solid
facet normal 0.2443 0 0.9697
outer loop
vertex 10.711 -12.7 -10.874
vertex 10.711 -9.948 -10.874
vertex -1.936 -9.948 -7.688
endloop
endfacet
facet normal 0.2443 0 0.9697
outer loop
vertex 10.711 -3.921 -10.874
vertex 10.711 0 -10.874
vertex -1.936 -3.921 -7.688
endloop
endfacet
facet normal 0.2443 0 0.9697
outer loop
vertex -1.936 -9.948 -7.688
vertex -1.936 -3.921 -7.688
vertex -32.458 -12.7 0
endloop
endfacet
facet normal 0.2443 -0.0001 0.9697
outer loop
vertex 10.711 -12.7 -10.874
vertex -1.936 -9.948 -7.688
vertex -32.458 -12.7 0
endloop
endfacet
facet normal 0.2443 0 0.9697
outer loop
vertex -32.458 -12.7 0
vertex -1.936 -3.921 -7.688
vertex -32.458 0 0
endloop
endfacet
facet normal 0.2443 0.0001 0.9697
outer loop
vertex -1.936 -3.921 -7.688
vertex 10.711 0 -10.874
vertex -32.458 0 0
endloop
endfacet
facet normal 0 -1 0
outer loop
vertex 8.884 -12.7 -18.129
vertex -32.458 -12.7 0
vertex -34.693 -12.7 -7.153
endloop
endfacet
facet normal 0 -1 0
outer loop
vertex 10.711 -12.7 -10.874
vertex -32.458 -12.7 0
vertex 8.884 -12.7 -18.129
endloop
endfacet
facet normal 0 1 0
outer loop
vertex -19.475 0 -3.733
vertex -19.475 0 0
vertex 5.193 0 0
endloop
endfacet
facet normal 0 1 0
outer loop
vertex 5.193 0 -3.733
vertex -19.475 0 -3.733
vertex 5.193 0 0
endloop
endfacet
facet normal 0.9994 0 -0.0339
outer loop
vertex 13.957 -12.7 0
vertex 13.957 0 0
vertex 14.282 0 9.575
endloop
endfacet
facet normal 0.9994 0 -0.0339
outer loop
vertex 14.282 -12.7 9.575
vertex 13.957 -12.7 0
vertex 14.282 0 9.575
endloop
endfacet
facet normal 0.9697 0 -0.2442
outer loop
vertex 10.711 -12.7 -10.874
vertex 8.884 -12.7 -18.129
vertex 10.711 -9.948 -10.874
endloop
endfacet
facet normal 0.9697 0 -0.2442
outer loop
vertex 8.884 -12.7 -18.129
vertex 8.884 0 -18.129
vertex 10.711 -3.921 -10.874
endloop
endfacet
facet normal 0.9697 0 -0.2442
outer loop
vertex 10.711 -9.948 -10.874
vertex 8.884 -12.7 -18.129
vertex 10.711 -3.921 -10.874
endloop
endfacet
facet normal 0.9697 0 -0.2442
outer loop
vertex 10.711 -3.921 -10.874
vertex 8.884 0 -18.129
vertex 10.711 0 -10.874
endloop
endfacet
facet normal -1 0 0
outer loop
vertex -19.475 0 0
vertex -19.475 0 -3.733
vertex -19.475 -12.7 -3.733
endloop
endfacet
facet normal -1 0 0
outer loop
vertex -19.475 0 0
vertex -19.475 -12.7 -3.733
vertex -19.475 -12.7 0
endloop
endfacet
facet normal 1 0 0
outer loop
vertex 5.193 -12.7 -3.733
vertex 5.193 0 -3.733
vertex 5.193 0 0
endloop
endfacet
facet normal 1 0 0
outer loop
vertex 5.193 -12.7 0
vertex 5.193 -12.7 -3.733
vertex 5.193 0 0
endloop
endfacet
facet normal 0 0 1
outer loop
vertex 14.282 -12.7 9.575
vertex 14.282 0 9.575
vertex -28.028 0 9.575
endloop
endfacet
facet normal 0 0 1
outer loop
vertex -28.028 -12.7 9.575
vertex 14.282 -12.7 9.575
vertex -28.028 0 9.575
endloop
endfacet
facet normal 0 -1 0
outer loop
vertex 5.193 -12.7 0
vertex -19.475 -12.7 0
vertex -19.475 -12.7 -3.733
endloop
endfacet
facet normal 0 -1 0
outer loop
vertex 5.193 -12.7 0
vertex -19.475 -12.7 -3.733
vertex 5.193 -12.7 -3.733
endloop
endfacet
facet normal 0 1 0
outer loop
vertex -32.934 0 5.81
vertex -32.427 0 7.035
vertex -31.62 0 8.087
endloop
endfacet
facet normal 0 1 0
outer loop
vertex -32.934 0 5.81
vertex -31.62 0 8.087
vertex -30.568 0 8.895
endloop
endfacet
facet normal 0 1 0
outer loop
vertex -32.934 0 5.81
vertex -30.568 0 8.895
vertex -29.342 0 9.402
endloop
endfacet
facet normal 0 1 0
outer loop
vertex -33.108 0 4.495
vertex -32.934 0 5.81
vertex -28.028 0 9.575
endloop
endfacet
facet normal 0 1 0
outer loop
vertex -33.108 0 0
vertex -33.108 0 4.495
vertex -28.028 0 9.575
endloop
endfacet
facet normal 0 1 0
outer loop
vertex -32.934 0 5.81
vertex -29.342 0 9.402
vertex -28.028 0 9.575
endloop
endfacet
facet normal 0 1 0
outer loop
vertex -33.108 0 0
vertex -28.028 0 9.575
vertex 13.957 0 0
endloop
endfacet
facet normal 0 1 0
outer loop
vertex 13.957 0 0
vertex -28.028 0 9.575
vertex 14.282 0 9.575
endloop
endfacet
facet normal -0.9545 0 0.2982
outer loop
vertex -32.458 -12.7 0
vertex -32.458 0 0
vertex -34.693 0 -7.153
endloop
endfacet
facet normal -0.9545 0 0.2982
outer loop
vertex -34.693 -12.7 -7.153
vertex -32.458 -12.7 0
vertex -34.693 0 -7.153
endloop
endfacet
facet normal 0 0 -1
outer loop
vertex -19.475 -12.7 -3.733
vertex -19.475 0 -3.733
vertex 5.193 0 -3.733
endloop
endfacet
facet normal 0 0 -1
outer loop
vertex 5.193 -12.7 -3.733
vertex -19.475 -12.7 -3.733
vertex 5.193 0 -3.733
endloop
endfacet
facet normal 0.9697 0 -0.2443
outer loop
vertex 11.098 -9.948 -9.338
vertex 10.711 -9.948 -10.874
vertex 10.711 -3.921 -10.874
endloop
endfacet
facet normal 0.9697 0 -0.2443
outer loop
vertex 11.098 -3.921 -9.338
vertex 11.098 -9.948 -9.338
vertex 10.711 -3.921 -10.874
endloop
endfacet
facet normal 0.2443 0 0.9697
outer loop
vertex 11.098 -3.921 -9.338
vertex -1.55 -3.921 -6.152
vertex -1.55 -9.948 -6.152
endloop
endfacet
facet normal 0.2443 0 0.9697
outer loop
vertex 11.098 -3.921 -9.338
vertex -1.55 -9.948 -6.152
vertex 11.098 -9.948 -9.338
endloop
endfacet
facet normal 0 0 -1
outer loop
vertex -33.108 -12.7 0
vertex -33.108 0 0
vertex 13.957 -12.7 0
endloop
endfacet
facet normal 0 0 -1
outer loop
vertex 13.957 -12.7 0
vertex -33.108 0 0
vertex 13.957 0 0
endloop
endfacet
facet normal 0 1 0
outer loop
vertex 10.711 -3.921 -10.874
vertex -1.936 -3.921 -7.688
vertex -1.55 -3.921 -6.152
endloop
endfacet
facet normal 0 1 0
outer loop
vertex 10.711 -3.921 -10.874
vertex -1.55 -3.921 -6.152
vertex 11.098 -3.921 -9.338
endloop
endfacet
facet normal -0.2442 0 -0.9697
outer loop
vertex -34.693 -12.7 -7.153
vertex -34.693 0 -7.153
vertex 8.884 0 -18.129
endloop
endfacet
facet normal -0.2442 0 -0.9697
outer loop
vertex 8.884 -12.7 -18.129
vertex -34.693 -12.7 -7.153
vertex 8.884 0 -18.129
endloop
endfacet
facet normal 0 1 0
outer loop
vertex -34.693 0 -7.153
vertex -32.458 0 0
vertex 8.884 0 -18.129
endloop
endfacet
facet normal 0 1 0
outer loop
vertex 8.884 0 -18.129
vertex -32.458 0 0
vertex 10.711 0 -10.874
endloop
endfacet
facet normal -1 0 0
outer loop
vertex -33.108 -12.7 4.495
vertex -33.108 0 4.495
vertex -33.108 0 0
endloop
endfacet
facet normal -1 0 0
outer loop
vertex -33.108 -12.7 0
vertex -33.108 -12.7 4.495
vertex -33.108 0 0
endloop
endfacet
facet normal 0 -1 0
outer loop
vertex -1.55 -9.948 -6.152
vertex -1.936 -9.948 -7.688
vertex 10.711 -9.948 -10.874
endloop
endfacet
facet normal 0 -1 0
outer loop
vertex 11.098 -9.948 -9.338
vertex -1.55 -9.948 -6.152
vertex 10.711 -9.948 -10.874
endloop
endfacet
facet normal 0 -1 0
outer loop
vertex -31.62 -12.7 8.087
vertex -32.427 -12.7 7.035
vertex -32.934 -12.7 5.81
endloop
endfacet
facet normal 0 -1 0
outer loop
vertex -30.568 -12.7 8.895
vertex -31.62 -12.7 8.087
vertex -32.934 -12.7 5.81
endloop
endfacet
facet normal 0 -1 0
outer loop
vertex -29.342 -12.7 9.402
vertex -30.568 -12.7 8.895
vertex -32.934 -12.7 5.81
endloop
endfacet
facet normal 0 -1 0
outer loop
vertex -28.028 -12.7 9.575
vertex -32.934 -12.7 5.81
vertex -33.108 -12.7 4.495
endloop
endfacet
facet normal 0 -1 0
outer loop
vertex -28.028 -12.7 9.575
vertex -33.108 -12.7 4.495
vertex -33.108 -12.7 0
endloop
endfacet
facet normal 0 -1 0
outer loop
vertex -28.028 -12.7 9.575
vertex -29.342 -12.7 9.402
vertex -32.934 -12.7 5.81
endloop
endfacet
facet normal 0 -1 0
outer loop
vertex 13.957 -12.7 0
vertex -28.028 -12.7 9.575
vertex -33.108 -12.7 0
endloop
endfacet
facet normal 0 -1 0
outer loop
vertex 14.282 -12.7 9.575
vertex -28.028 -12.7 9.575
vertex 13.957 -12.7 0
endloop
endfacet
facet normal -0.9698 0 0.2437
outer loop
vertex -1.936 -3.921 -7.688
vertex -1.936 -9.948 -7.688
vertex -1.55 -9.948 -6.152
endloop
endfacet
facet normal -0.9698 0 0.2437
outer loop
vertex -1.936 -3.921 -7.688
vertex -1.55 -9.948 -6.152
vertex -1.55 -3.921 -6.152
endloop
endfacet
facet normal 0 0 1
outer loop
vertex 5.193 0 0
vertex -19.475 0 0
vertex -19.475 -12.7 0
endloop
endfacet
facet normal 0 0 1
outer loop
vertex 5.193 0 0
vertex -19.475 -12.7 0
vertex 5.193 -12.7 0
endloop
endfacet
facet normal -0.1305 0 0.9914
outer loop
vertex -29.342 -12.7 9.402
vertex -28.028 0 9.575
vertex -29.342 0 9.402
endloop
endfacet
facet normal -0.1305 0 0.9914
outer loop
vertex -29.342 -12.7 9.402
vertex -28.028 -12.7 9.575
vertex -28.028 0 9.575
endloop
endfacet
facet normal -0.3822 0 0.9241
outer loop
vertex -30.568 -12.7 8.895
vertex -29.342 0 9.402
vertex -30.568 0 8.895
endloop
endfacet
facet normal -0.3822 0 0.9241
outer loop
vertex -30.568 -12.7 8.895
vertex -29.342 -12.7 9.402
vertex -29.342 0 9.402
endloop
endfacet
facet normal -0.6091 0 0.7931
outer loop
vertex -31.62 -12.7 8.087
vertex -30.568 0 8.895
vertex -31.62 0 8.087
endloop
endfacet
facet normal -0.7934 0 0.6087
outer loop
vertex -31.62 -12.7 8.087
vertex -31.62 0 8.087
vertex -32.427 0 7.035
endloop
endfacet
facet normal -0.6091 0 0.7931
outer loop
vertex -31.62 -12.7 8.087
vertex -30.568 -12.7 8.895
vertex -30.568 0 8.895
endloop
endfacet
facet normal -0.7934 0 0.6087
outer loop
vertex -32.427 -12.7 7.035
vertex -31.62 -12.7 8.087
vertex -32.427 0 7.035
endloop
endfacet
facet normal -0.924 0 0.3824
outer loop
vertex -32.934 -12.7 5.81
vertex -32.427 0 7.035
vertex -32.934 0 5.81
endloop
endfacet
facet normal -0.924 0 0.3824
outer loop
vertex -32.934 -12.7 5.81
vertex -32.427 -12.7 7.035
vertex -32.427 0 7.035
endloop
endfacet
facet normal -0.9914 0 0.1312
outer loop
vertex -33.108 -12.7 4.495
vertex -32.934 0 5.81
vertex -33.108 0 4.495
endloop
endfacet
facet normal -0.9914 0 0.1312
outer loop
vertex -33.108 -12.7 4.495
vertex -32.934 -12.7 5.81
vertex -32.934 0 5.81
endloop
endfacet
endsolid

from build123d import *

# Parameters (mm, degrees)
F1_DEPTH = 12.7
F3_DEPTH = 12.7
F4_W     = 24.668398
F4_H     = 3.732718
F5_DEPTH = 12.7
F6_W     = 13.042734
F6_H     = 6.027006
F7_DEPTH = 1.58349
F8_R     = 5.08


with BuildPart() as f1:
    # F0 (on Front) → F1 (new body)
    with BuildSketch(Plane.XZ):
        Polygon((-33.107586, 0), (13.957119, 0), (14.281703, 9.575234), (-33.107586, 9.575234), align=None)
    extrude(amount=F1_DEPTH)

    # F8
    f8_edges = [f1.edges().sort_by_distance(p)[0] for p in [
        (-33.107586, -6.35, 9.575234),
    ]]
    fillet(f8_edges, radius=F8_R)


with BuildPart() as f3:
    # F2 (on Front) → F3 (new body)
    with BuildSketch(Plane.XZ):
        Polygon((10.711278, -10.873571), (-32.458417, 0), (-34.692648, -7.152828), (8.883818, -18.128857), align=None)
    extrude(amount=F3_DEPTH)

    # F6 (on face) → F7 (join)
    with BuildSketch(Plane(origin=(-1.936419, 0, -7.687873), x_dir=(0.969712, 0, -0.244251), z_dir=(0.244251, 0, 0.969712))):
        with Locations((6.521367, -6.934733)):
            Rectangle(F6_W, F6_H)
    extrude(amount=F7_DEPTH)


with BuildPart() as f5:
    # F4 (on Front) → F5 (new body)
    with BuildSketch(Plane.XZ):
        with Locations((-7.140851, -1.866359)):
            Rectangle(F4_W, F4_H)
    extrude(amount=F5_DEPTH)


solid = Compound([f1.part, f3.part, f5.part])
